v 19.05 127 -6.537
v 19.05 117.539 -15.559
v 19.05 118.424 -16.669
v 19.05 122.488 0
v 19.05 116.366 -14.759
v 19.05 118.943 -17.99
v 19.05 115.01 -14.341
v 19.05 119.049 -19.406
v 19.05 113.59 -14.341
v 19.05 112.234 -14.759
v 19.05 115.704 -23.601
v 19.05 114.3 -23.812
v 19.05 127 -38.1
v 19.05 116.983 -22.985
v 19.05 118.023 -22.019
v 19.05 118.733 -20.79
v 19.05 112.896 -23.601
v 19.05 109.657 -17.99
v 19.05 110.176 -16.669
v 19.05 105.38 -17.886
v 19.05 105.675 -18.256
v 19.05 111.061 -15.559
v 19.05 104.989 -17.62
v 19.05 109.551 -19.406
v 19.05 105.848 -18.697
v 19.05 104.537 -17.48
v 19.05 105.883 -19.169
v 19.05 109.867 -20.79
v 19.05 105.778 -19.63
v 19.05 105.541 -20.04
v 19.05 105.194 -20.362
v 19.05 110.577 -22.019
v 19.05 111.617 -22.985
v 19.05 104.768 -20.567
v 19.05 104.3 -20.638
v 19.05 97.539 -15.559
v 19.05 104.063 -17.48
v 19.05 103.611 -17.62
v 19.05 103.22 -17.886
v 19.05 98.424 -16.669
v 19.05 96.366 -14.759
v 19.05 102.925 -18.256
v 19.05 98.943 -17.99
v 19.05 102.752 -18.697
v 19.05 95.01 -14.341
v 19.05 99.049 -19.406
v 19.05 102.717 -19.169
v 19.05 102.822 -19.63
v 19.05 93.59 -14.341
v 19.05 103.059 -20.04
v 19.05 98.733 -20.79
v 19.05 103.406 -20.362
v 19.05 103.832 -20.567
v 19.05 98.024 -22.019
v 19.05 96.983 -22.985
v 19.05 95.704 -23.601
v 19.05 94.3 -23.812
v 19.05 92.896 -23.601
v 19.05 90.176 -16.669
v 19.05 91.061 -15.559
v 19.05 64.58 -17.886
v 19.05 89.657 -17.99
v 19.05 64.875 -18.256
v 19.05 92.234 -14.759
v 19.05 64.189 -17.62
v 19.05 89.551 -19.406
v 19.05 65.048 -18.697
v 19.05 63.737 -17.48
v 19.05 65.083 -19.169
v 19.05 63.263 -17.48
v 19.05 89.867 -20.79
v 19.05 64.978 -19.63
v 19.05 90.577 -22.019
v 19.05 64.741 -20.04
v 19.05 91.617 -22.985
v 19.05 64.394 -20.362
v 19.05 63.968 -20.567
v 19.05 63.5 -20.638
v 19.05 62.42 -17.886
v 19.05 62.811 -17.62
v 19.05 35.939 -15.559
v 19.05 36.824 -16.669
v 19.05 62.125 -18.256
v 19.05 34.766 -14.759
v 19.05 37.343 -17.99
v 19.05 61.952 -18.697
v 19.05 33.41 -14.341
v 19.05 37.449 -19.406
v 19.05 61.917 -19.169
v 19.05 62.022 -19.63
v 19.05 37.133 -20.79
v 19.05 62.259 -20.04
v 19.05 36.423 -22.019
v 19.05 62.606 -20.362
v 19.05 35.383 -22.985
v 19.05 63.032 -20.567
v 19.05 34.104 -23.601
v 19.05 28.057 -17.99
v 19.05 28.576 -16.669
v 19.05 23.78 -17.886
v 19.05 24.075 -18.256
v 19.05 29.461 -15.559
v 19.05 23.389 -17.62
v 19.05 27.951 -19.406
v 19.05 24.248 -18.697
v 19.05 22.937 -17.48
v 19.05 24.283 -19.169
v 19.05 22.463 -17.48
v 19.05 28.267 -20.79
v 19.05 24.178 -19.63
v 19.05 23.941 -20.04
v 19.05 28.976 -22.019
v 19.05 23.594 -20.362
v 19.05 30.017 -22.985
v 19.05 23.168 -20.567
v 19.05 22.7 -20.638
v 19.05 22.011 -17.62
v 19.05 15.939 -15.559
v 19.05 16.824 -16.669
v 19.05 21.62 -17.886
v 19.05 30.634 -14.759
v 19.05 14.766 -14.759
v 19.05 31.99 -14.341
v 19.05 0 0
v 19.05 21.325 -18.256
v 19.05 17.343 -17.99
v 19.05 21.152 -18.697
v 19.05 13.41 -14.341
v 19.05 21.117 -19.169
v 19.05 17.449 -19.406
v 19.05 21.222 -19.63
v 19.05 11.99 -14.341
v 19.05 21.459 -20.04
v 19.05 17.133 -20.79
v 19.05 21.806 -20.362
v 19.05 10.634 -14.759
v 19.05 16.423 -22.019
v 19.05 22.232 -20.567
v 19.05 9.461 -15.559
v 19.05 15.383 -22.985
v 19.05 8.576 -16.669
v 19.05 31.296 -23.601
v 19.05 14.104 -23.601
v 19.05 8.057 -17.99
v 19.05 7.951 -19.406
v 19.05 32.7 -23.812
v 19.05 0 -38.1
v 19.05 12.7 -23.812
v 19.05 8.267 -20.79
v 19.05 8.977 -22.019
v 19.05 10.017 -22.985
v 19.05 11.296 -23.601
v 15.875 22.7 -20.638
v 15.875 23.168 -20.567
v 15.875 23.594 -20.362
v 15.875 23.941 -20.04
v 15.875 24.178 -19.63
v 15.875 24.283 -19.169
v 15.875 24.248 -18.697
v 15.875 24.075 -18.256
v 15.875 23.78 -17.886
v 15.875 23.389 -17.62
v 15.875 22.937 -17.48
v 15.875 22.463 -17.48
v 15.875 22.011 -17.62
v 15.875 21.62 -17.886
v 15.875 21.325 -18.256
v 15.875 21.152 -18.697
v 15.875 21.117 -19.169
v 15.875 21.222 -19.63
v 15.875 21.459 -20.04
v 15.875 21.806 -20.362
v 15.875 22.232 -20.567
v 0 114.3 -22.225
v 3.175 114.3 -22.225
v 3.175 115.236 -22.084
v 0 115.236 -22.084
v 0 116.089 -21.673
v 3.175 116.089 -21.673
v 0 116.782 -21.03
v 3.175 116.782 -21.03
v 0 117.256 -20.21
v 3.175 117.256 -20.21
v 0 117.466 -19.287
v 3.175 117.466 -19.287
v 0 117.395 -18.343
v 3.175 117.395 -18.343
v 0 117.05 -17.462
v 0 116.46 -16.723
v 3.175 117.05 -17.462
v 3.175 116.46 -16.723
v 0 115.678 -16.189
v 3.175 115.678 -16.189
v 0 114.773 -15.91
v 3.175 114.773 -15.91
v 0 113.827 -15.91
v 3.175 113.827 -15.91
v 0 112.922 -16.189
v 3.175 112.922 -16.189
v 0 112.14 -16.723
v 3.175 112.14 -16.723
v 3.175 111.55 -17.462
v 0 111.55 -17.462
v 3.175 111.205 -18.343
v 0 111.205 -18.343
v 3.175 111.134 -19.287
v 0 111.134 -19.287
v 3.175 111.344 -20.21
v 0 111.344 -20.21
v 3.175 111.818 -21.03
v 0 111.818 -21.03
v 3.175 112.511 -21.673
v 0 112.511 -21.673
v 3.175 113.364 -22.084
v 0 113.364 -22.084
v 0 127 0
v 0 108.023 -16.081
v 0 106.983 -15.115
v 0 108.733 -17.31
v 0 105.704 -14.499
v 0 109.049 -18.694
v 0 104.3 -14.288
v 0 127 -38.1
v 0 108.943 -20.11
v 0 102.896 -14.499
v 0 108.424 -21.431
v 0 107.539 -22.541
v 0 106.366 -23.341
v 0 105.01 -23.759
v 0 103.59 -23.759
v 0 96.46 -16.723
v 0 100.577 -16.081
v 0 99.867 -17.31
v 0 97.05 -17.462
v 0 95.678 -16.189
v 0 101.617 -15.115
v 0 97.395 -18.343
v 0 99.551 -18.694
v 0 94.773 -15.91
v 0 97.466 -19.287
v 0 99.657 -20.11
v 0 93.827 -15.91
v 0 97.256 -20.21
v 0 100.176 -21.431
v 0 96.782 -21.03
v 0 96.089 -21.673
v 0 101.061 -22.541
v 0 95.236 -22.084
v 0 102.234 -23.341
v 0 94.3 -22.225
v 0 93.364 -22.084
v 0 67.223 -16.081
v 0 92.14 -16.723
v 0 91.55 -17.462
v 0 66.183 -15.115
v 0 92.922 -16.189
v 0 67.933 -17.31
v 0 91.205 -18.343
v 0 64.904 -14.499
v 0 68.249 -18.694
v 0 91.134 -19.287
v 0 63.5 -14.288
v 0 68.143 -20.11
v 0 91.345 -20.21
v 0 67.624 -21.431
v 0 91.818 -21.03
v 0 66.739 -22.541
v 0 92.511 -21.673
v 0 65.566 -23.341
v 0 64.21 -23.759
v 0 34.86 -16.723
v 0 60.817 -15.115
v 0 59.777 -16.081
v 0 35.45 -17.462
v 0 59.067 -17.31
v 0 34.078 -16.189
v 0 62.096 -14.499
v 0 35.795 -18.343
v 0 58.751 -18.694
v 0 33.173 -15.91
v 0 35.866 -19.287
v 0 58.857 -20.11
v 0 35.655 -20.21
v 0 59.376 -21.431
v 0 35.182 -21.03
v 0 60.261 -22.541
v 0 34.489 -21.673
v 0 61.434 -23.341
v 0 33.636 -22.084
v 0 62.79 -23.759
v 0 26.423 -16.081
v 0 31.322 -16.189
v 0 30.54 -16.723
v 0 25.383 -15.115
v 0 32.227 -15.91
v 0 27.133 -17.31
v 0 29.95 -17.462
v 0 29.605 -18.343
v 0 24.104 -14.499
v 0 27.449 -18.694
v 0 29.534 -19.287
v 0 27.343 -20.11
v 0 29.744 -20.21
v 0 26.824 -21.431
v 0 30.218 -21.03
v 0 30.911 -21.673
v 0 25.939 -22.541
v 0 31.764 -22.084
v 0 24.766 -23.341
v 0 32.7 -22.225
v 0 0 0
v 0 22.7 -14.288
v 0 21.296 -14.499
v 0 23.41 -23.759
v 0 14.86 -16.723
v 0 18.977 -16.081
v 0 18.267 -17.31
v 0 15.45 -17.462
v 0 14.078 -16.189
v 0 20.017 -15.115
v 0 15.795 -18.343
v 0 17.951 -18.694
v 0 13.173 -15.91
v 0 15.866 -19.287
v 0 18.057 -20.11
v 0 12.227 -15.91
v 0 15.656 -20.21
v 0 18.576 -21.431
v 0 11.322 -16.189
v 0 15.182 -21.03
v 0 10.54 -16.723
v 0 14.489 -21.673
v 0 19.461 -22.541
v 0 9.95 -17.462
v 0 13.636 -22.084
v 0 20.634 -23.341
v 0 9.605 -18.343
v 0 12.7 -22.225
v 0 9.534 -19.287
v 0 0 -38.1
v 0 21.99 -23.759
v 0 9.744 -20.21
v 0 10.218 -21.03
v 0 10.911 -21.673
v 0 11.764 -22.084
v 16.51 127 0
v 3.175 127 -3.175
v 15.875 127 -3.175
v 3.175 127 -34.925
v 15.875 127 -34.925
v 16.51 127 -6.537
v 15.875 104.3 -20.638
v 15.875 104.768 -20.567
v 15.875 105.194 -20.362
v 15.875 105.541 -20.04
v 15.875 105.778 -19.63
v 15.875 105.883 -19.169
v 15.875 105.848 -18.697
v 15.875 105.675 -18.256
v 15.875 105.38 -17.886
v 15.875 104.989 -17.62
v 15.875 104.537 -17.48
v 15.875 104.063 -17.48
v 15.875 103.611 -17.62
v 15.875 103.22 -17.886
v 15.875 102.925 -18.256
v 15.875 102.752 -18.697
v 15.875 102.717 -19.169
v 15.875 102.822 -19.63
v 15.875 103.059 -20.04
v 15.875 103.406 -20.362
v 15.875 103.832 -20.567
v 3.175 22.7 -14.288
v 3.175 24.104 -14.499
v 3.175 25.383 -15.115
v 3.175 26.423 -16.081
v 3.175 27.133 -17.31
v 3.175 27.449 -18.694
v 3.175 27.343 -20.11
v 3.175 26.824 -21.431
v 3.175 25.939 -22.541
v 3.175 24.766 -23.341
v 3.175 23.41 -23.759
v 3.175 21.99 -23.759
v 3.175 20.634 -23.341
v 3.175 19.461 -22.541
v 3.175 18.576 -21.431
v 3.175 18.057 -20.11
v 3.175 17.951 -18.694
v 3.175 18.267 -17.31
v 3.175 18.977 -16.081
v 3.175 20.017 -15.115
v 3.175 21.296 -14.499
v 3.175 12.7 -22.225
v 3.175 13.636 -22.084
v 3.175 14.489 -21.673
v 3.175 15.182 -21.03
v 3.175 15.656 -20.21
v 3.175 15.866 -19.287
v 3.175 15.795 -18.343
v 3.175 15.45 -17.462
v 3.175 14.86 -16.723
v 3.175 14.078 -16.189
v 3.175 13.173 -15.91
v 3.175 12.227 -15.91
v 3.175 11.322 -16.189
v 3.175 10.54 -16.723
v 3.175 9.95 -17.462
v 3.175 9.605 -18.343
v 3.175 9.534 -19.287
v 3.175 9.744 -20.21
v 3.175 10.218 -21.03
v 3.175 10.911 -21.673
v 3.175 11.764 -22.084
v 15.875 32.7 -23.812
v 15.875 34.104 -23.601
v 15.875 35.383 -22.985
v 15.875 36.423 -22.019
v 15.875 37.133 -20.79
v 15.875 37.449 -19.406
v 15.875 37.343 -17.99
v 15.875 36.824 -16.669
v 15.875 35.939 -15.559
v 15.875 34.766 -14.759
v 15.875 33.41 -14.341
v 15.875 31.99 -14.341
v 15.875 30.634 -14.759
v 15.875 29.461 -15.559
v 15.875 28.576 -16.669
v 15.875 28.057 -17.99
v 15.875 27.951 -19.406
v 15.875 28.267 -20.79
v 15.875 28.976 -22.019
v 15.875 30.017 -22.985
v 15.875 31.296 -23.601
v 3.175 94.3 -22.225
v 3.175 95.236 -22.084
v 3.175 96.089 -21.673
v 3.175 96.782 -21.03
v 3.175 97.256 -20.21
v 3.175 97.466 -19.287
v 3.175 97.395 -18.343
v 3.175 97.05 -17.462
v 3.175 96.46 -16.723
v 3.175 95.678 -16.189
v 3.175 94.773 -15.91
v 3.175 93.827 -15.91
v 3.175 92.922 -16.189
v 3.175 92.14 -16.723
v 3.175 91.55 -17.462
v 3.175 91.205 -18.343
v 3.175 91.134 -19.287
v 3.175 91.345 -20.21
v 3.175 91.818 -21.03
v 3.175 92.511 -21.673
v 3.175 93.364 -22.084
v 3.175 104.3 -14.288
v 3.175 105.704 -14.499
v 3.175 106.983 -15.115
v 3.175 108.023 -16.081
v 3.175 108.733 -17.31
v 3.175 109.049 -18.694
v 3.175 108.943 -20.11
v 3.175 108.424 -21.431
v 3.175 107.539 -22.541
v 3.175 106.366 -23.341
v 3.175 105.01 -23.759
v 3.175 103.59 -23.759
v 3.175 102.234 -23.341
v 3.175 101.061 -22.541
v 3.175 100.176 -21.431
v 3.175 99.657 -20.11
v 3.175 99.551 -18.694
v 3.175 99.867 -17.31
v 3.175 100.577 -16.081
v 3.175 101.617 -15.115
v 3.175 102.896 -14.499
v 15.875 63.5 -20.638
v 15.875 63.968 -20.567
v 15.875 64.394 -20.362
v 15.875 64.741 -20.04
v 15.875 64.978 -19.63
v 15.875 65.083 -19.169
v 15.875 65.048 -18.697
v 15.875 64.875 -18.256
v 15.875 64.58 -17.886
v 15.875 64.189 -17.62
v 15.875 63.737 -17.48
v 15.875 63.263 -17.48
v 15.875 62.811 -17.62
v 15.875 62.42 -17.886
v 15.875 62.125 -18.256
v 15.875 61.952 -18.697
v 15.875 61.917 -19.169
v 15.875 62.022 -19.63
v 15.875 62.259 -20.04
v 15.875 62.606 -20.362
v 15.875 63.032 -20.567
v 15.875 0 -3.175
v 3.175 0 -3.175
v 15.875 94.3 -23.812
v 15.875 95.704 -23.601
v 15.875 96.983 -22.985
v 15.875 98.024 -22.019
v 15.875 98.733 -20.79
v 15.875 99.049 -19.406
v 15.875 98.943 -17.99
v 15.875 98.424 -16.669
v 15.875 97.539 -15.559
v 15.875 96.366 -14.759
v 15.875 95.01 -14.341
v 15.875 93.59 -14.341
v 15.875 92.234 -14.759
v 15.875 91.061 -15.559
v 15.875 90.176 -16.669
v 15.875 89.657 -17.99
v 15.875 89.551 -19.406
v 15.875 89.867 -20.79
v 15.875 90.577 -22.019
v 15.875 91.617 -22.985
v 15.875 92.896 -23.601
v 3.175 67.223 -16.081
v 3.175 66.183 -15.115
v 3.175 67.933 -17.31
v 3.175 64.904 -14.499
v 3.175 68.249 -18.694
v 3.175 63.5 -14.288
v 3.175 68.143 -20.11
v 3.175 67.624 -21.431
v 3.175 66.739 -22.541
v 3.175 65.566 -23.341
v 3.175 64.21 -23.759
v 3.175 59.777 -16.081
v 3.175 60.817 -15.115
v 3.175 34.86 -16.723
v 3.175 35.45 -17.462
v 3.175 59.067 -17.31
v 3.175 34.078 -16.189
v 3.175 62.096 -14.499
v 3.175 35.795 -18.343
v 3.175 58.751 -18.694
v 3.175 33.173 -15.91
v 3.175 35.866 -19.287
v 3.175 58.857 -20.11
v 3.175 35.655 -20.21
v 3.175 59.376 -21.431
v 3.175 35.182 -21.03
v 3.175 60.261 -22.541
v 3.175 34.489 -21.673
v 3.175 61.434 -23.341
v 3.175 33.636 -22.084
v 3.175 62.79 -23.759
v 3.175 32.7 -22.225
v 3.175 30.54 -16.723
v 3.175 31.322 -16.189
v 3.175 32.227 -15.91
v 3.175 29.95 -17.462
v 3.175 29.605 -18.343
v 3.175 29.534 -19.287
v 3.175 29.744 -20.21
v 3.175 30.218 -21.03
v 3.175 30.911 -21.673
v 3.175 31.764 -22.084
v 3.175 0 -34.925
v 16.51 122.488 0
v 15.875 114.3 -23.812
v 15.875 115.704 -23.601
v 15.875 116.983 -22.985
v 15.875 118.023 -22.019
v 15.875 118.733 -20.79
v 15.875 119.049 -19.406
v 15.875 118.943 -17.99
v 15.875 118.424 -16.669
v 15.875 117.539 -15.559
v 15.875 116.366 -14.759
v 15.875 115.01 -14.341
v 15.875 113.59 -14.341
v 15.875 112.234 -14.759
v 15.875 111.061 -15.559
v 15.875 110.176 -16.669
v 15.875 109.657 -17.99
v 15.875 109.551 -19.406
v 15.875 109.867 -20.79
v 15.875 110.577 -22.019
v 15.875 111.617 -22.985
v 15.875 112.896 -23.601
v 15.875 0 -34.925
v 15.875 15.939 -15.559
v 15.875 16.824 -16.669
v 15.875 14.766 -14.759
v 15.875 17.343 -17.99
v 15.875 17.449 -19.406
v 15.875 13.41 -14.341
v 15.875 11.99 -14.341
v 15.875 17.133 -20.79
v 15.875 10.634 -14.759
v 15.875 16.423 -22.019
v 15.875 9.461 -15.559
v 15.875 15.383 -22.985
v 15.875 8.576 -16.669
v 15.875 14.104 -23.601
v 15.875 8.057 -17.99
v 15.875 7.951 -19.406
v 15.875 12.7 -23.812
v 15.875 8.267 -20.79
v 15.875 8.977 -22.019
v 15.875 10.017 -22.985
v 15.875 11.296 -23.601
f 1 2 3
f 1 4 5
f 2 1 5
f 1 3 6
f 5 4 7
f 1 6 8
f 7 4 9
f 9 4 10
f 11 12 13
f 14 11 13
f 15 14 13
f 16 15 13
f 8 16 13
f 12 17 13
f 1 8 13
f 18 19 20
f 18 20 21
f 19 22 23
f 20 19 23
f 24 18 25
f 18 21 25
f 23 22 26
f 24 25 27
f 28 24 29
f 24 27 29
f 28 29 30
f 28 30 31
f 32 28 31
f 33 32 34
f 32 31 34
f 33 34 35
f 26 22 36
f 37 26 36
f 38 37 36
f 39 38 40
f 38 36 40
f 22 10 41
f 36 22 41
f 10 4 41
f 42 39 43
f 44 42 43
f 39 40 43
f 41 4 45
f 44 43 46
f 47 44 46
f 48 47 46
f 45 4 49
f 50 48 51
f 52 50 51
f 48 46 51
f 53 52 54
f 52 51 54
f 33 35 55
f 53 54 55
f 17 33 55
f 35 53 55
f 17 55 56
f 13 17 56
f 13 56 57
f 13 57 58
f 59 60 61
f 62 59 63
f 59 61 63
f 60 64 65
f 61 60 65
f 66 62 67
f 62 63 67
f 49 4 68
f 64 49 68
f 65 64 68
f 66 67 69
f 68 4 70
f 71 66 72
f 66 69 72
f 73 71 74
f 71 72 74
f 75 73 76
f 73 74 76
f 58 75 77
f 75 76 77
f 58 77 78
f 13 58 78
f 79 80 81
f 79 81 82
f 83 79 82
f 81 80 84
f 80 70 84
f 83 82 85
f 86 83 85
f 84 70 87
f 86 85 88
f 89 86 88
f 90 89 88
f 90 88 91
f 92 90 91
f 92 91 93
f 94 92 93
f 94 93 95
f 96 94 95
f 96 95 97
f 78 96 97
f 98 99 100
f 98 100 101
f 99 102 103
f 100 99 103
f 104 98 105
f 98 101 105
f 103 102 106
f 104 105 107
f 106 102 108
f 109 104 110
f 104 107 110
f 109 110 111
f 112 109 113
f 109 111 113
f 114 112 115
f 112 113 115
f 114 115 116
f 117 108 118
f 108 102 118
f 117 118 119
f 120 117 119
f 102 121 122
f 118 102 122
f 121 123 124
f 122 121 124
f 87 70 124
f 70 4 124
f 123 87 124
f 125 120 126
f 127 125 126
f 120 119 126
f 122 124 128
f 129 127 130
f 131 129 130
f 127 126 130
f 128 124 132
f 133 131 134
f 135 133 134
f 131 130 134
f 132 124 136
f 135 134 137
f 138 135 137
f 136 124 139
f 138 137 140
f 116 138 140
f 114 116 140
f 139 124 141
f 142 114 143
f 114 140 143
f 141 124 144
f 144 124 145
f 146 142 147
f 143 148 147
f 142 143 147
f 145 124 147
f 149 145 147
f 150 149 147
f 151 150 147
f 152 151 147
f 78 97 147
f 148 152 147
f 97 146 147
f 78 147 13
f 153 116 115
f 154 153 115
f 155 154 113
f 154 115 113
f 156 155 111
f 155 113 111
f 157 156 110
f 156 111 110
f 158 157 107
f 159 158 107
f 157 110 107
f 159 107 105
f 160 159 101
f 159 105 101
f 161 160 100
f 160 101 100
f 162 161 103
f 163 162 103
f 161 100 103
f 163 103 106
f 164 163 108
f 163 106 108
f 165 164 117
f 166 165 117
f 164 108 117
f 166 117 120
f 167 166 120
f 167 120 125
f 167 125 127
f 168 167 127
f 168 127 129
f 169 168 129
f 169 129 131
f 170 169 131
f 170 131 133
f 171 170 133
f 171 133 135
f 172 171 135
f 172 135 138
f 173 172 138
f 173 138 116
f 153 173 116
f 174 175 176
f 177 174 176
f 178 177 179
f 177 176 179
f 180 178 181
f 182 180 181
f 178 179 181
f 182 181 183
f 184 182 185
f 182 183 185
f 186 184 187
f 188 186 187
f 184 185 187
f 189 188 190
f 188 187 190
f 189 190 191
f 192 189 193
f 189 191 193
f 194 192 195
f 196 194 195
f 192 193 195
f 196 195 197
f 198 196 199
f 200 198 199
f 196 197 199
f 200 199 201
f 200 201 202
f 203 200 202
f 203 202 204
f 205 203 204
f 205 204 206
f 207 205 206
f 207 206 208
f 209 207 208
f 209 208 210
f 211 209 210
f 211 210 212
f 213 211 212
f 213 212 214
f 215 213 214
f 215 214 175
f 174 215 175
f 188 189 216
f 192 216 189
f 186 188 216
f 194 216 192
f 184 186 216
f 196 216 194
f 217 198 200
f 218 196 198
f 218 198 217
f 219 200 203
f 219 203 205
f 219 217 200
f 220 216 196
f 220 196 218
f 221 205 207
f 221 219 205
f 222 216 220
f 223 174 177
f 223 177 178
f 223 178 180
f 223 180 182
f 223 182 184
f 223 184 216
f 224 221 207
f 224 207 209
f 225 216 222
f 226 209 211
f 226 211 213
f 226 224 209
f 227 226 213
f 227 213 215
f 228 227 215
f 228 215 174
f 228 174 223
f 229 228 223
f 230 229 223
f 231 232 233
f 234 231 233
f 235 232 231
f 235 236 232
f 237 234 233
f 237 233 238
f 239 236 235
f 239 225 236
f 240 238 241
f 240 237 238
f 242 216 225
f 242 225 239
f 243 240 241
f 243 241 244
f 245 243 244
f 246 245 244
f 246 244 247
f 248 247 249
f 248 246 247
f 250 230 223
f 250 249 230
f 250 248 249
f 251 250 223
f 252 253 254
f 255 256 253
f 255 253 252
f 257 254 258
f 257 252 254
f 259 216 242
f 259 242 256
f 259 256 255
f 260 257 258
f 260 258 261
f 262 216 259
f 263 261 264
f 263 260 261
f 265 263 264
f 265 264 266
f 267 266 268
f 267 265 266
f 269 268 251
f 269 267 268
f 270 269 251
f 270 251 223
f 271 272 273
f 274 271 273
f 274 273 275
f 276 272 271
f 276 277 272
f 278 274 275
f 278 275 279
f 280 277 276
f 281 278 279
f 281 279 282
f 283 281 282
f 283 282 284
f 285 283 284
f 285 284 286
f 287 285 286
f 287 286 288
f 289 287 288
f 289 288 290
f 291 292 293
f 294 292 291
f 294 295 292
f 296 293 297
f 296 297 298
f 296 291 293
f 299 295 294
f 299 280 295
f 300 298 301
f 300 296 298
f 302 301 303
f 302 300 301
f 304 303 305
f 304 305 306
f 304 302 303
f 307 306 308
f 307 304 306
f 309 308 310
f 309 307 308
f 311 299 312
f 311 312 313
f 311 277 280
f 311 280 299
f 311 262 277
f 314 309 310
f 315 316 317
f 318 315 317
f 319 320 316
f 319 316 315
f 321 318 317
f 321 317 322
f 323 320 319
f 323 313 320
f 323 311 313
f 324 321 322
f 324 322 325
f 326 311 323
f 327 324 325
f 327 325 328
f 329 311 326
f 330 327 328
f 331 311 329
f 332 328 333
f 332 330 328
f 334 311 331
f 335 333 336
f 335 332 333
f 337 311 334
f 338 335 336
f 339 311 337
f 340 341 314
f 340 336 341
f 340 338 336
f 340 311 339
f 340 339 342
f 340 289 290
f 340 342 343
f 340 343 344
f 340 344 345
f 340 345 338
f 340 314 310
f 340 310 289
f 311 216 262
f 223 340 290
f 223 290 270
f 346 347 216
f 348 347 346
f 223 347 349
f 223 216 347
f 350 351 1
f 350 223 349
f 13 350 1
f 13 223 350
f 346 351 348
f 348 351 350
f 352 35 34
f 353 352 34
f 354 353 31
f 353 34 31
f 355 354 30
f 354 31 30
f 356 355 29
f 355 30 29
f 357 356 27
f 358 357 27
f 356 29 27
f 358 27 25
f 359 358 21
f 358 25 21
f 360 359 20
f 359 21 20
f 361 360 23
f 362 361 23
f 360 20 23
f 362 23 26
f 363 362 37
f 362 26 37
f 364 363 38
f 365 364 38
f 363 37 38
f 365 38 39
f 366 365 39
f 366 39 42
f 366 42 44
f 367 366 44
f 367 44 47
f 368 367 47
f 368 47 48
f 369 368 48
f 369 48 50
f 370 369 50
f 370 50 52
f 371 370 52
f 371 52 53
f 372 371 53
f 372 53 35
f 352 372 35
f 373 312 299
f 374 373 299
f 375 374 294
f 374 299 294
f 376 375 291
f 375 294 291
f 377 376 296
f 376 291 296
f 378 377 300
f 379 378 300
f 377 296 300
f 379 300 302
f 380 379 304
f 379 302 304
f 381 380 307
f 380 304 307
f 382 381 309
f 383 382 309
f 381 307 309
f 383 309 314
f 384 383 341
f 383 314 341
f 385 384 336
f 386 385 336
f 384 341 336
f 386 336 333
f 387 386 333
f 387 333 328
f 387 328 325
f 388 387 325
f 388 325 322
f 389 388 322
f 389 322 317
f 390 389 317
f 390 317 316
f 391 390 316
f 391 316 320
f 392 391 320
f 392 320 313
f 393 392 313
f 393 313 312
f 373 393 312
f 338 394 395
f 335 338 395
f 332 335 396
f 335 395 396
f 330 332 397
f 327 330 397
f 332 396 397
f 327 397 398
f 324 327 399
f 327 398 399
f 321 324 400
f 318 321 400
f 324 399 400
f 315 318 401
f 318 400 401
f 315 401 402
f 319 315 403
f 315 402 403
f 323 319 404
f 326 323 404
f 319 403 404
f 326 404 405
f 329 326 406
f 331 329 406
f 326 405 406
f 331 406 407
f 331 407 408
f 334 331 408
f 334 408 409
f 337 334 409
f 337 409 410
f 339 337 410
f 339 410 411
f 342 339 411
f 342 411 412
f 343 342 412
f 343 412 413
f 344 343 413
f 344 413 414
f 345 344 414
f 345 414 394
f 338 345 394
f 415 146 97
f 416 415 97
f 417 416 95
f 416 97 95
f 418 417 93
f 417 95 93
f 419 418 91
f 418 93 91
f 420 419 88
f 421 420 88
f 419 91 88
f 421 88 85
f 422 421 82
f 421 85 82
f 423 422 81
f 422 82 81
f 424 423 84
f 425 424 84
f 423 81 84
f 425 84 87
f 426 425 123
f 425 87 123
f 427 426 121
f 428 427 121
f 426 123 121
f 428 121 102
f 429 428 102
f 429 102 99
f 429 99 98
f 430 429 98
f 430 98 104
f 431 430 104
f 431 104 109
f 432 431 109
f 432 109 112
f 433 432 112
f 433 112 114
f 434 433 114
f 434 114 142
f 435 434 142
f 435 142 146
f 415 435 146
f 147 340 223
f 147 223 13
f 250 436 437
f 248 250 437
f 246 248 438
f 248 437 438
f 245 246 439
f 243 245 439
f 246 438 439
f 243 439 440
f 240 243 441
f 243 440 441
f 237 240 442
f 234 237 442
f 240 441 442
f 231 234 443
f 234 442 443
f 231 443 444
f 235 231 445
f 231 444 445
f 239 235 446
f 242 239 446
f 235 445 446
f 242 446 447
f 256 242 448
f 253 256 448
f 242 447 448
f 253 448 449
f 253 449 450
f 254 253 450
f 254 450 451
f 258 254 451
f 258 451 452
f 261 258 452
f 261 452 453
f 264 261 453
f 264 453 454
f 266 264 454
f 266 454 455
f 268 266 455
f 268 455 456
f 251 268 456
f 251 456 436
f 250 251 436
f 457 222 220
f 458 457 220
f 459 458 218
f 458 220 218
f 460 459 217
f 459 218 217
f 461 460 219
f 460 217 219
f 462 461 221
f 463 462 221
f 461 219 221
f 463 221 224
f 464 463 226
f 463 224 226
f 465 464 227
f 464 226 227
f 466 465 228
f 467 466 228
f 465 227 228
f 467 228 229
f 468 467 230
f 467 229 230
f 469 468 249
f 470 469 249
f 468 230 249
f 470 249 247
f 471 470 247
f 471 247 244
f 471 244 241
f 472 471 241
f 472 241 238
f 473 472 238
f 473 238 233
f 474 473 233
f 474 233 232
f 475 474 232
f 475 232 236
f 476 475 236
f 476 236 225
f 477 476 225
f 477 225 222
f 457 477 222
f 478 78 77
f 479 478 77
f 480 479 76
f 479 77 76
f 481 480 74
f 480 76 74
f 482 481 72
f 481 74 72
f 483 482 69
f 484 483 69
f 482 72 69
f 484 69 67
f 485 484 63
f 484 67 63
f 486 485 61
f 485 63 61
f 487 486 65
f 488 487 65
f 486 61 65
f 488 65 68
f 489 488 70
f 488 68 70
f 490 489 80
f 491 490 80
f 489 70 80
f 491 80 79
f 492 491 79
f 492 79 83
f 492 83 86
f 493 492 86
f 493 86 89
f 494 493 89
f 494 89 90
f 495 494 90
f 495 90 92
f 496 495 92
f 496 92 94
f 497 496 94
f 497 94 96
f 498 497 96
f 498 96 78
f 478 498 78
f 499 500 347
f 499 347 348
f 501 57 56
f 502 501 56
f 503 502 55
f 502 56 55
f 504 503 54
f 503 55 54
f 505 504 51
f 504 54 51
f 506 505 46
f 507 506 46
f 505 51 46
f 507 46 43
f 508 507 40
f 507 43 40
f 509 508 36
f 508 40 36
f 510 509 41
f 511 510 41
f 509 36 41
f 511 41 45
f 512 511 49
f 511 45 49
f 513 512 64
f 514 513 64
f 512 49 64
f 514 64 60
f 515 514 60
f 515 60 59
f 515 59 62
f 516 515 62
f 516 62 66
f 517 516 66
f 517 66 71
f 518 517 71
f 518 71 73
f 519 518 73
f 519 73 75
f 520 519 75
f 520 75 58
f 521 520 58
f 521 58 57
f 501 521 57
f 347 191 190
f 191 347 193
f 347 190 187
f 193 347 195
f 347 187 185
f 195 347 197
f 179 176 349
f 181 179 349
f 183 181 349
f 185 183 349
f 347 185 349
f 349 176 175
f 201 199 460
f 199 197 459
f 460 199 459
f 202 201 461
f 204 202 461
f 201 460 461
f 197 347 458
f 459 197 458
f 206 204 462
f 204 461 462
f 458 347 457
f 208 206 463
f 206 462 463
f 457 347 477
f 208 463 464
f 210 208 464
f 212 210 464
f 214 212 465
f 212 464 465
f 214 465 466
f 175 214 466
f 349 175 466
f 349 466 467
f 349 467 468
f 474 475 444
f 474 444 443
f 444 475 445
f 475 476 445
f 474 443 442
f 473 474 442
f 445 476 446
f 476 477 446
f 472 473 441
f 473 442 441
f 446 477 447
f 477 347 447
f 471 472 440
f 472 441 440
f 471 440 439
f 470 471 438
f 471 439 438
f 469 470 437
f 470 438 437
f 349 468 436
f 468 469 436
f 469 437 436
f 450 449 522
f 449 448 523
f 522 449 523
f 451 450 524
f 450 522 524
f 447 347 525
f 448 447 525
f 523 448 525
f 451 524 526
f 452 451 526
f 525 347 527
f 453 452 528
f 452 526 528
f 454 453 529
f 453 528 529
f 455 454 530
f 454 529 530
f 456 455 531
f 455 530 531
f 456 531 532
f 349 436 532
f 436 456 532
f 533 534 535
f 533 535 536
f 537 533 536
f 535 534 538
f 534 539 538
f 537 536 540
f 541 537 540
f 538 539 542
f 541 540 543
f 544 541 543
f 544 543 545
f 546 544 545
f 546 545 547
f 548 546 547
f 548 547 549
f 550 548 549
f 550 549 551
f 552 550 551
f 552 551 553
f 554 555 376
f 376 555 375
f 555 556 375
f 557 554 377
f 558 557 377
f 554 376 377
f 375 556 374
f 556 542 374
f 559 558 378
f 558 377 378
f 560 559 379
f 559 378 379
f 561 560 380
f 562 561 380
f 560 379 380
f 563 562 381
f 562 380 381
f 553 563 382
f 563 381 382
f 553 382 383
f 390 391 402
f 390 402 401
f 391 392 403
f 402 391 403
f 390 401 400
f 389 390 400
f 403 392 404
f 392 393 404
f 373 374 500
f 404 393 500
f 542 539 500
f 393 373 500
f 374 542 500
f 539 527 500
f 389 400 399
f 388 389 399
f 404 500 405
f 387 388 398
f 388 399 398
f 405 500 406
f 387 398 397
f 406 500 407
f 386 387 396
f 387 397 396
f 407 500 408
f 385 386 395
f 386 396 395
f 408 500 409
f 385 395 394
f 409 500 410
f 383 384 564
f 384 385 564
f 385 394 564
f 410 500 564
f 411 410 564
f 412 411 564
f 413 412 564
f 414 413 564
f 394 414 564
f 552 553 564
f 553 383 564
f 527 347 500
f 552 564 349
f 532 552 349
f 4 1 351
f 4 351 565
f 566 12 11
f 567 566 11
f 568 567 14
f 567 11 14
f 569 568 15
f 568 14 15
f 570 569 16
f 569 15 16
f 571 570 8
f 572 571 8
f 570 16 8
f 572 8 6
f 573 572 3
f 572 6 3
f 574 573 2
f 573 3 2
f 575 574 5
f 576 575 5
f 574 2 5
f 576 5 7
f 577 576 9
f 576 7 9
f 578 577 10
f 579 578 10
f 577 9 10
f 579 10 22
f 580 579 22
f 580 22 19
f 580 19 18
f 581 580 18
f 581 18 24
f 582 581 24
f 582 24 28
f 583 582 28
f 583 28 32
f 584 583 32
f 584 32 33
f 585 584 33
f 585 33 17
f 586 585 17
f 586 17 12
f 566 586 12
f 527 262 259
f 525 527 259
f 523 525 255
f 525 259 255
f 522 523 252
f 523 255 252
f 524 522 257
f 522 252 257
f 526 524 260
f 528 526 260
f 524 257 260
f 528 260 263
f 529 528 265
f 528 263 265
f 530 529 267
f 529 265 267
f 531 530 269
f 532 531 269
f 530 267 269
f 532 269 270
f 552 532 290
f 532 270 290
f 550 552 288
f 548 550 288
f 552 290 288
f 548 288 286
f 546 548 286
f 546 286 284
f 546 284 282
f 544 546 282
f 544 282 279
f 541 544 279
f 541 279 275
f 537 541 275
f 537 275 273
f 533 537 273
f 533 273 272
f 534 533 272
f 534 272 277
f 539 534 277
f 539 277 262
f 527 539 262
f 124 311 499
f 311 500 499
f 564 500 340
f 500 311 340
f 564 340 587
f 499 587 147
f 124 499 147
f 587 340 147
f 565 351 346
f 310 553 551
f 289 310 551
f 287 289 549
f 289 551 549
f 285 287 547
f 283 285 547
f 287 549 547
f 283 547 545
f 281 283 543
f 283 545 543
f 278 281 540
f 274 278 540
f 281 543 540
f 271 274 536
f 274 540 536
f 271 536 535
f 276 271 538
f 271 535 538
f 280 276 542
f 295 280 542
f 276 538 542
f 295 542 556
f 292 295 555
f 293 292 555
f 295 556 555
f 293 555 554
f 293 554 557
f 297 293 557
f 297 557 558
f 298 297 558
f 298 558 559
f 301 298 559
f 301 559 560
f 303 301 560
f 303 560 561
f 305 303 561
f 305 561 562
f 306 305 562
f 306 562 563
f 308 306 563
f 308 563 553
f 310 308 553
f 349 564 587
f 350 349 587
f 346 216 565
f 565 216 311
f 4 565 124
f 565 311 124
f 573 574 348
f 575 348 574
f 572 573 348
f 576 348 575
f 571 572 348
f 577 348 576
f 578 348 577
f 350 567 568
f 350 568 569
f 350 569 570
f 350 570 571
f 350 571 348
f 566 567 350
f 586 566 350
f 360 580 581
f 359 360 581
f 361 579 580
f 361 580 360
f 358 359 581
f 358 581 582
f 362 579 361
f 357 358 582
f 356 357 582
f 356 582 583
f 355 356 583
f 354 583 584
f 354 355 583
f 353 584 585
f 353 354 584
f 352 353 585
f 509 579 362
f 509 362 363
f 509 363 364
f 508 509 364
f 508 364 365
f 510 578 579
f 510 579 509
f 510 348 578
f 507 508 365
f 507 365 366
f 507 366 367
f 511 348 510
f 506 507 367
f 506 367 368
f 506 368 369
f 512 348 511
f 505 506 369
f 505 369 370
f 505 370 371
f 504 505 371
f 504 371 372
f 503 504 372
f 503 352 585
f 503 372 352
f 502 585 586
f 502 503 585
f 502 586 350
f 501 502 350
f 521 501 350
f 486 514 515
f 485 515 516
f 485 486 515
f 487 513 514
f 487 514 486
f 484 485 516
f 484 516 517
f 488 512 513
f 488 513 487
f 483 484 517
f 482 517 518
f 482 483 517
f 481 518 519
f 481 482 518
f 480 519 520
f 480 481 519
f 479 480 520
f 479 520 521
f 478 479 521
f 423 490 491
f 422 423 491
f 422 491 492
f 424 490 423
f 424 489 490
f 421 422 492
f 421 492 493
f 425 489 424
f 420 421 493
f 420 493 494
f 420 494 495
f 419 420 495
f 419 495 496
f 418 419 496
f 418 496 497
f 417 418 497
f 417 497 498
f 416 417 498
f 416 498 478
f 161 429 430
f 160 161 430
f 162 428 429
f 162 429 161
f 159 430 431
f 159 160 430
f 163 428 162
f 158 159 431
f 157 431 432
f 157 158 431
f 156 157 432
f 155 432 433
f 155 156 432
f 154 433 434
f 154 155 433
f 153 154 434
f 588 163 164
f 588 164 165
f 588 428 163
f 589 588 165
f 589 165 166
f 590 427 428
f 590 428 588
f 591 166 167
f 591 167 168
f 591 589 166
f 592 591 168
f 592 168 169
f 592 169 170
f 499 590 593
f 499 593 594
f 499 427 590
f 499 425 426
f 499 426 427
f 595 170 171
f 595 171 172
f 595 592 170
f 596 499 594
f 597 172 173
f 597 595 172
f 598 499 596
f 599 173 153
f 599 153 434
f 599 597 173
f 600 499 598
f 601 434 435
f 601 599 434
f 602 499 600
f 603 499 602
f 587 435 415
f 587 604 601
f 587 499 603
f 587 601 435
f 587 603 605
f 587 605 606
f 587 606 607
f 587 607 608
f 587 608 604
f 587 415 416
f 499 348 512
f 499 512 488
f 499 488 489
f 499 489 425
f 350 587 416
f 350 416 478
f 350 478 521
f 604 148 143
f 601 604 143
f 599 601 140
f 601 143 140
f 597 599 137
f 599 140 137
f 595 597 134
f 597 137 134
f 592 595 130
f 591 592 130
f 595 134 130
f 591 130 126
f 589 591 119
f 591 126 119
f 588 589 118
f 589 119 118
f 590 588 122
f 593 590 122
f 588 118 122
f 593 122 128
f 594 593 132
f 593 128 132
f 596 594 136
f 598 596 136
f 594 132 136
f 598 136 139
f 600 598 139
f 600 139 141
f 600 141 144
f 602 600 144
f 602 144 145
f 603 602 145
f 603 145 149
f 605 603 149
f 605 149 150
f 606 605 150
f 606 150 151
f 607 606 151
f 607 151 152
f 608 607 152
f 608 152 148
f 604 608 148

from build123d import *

# Parameters (mm, degrees)
SKETCH1_W           = 19.05
SKETCH1_H           = 38.1
SKETCH1_W_2         = 12.7
SKETCH1_H_2         = 31.75
BOSS_EXTRUDE1_DEPTH = 127
SKETCH2_R           = 3.175
CUT_EXTRUDE1_DEPTH  = 20.05
CUT_EXTRUDE2_REACH  = 21.05
SKETCH3_R           = 4.7625
SKETCH4_R           = 1.5875
UCHAN_MOUNT_DEPTH   = 20.05
CUT_EXTRUDE4_REACH  = 21.05
SKETCH5_R           = 4.7625
CUT_EXTRUDE5_DEPTH  = 2.54


with BuildPart() as part:
    # Sketch1 → Boss-Extrude1 (new body)
    with BuildSketch(Plane(origin=(0, 0, 0), x_dir=(1, 0, 0), z_dir=(0, 1, 0))):
        with Locations((9.525, 19.05)):
            Rectangle(SKETCH1_W, SKETCH1_H)
        with Locations((9.525, 19.05)):
            Rectangle(SKETCH1_W_2, SKETCH1_H_2, mode=Mode.SUBTRACT)
    extrude(amount=BOSS_EXTRUDE1_DEPTH)

    # Sketch2 → Cut-Extrude1 (cut, through all)
    with BuildSketch(Plane(origin=(19.05, 0, 0), x_dir=(0, 0, -1), z_dir=(1, 0, 0))):
        with Locations((19.05, 12.7)):
            Circle(SKETCH2_R)
        with Locations((19.05, 32.69996)):
            Circle(SKETCH2_R)
        with Locations((19.05, 94.30004)):
            Circle(SKETCH2_R)
        with Locations((19.05, 114.3)):
            Circle(SKETCH2_R)
    extrude(amount=-CUT_EXTRUDE1_DEPTH, mode=Mode.SUBTRACT)

    # Sketch3 → Cut-Extrude2 (cut, up to next)
    with BuildSketch(Plane(origin=(19.05, 0, 0), x_dir=(0, 0, -1), z_dir=(1, 0, 0)), mode=Mode.PRIVATE) as cut_extrude2_sk1:
        with Locations((19.05, 114.3)):
            Circle(SKETCH3_R)
    cut_extrude2_tool1 = extrude(cut_extrude2_sk1.sketch, amount=-CUT_EXTRUDE2_REACH, mode=Mode.PRIVATE) & part.part
    add(cut_extrude2_tool1.solids().sort_by_distance((19.05, 114.3, -19.05))[0], mode=Mode.SUBTRACT)
    # Sketch3 → Cut-Extrude2 (cut, up to next)
    with BuildSketch(Plane(origin=(19.05, 0, 0), x_dir=(0, 0, -1), z_dir=(1, 0, 0)), mode=Mode.PRIVATE) as cut_extrude2_sk2:
        with Locations((19.05, 94.30004)):
            Circle(SKETCH3_R)
    cut_extrude2_tool2 = extrude(cut_extrude2_sk2.sketch, amount=-CUT_EXTRUDE2_REACH, mode=Mode.PRIVATE) & part.part
    add(cut_extrude2_tool2.solids().sort_by_distance((19.05, 94.30004, -19.05))[0], mode=Mode.SUBTRACT)
    # Sketch3 → Cut-Extrude2 (cut, up to next)
    with BuildSketch(Plane(origin=(19.05, 0, 0), x_dir=(0, 0, -1), z_dir=(1, 0, 0)), mode=Mode.PRIVATE) as cut_extrude2_sk3:
        with Locations((19.05, 32.69996)):
            Circle(SKETCH3_R)
    cut_extrude2_tool3 = extrude(cut_extrude2_sk3.sketch, amount=-CUT_EXTRUDE2_REACH, mode=Mode.PRIVATE) & part.part
    add(cut_extrude2_tool3.solids().sort_by_distance((19.05, 32.69996, -19.05))[0], mode=Mode.SUBTRACT)
    # Sketch3 → Cut-Extrude2 (cut, up to next)
    with BuildSketch(Plane(origin=(19.05, 0, 0), x_dir=(0, 0, -1), z_dir=(1, 0, 0)), mode=Mode.PRIVATE) as cut_extrude2_sk4:
        with Locations((19.05, 12.7)):
            Circle(SKETCH3_R)
    cut_extrude2_tool4 = extrude(cut_extrude2_sk4.sketch, amount=-CUT_EXTRUDE2_REACH, mode=Mode.PRIVATE) & part.part
    add(cut_extrude2_tool4.solids().sort_by_distance((19.05, 12.7, -19.05))[0], mode=Mode.SUBTRACT)

    # Sketch4 → UChan_Mount (cut, through all)
    with BuildSketch(Plane(origin=(19.05, 0, 0), x_dir=(0, 0, -1), z_dir=(1, 0, 0))):
        with Locations((19.05, 22.69998)):
            Circle(SKETCH4_R)
        with Locations((19.05, 63.5)):
            Circle(SKETCH4_R)
        with Locations((19.05, 104.30002)):
            Circle(SKETCH4_R)
    extrude(amount=-UCHAN_MOUNT_DEPTH, mode=Mode.SUBTRACT)

    # Sketch5 → Cut-Extrude4 (cut, up to next)
    with BuildSketch(Plane.ZY, mode=Mode.PRIVATE) as cut_extrude4_sk1:
        with Locations((-19.05, 104.30002)):
            Circle(SKETCH5_R)
    cut_extrude4_tool1 = extrude(cut_extrude4_sk1.sketch, amount=-CUT_EXTRUDE4_REACH, mode=Mode.PRIVATE) & part.part
    add(cut_extrude4_tool1.solids().sort_by_distance((0, 104.30002, -19.05))[0], mode=Mode.SUBTRACT)
    # Sketch5 → Cut-Extrude4 (cut, up to next)
    with BuildSketch(Plane.ZY, mode=Mode.PRIVATE) as cut_extrude4_sk2:
        with Locations((-19.05, 63.5)):
            Circle(SKETCH5_R)
    cut_extrude4_tool2 = extrude(cut_extrude4_sk2.sketch, amount=-CUT_EXTRUDE4_REACH, mode=Mode.PRIVATE) & part.part
    add(cut_extrude4_tool2.solids().sort_by_distance((0, 63.5, -19.05))[0], mode=Mode.SUBTRACT)
    # Sketch5 → Cut-Extrude4 (cut, up to next)
    with BuildSketch(Plane.ZY, mode=Mode.PRIVATE) as cut_extrude4_sk3:
        with Locations((-19.05, 22.69998)):
            Circle(SKETCH5_R)
    cut_extrude4_tool3 = extrude(cut_extrude4_sk3.sketch, amount=-CUT_EXTRUDE4_REACH, mode=Mode.PRIVATE) & part.part
    add(cut_extrude4_tool3.solids().sort_by_distance((0, 22.69998, -19.05))[0], mode=Mode.SUBTRACT)

    # Sketch6 → Cut-Extrude5 (cut)
    with BuildSketch(Plane(origin=(19.05, 0, 0), x_dir=(0, 0, -1), z_dir=(1, 0, 0))):
        Polygon((0, 127), (6.5373666, 127), (0, 122.48760451), align=None)
    extrude(amount=-CUT_EXTRUDE5_DEPTH, mode=Mode.SUBTRACT)


solid = part.part
